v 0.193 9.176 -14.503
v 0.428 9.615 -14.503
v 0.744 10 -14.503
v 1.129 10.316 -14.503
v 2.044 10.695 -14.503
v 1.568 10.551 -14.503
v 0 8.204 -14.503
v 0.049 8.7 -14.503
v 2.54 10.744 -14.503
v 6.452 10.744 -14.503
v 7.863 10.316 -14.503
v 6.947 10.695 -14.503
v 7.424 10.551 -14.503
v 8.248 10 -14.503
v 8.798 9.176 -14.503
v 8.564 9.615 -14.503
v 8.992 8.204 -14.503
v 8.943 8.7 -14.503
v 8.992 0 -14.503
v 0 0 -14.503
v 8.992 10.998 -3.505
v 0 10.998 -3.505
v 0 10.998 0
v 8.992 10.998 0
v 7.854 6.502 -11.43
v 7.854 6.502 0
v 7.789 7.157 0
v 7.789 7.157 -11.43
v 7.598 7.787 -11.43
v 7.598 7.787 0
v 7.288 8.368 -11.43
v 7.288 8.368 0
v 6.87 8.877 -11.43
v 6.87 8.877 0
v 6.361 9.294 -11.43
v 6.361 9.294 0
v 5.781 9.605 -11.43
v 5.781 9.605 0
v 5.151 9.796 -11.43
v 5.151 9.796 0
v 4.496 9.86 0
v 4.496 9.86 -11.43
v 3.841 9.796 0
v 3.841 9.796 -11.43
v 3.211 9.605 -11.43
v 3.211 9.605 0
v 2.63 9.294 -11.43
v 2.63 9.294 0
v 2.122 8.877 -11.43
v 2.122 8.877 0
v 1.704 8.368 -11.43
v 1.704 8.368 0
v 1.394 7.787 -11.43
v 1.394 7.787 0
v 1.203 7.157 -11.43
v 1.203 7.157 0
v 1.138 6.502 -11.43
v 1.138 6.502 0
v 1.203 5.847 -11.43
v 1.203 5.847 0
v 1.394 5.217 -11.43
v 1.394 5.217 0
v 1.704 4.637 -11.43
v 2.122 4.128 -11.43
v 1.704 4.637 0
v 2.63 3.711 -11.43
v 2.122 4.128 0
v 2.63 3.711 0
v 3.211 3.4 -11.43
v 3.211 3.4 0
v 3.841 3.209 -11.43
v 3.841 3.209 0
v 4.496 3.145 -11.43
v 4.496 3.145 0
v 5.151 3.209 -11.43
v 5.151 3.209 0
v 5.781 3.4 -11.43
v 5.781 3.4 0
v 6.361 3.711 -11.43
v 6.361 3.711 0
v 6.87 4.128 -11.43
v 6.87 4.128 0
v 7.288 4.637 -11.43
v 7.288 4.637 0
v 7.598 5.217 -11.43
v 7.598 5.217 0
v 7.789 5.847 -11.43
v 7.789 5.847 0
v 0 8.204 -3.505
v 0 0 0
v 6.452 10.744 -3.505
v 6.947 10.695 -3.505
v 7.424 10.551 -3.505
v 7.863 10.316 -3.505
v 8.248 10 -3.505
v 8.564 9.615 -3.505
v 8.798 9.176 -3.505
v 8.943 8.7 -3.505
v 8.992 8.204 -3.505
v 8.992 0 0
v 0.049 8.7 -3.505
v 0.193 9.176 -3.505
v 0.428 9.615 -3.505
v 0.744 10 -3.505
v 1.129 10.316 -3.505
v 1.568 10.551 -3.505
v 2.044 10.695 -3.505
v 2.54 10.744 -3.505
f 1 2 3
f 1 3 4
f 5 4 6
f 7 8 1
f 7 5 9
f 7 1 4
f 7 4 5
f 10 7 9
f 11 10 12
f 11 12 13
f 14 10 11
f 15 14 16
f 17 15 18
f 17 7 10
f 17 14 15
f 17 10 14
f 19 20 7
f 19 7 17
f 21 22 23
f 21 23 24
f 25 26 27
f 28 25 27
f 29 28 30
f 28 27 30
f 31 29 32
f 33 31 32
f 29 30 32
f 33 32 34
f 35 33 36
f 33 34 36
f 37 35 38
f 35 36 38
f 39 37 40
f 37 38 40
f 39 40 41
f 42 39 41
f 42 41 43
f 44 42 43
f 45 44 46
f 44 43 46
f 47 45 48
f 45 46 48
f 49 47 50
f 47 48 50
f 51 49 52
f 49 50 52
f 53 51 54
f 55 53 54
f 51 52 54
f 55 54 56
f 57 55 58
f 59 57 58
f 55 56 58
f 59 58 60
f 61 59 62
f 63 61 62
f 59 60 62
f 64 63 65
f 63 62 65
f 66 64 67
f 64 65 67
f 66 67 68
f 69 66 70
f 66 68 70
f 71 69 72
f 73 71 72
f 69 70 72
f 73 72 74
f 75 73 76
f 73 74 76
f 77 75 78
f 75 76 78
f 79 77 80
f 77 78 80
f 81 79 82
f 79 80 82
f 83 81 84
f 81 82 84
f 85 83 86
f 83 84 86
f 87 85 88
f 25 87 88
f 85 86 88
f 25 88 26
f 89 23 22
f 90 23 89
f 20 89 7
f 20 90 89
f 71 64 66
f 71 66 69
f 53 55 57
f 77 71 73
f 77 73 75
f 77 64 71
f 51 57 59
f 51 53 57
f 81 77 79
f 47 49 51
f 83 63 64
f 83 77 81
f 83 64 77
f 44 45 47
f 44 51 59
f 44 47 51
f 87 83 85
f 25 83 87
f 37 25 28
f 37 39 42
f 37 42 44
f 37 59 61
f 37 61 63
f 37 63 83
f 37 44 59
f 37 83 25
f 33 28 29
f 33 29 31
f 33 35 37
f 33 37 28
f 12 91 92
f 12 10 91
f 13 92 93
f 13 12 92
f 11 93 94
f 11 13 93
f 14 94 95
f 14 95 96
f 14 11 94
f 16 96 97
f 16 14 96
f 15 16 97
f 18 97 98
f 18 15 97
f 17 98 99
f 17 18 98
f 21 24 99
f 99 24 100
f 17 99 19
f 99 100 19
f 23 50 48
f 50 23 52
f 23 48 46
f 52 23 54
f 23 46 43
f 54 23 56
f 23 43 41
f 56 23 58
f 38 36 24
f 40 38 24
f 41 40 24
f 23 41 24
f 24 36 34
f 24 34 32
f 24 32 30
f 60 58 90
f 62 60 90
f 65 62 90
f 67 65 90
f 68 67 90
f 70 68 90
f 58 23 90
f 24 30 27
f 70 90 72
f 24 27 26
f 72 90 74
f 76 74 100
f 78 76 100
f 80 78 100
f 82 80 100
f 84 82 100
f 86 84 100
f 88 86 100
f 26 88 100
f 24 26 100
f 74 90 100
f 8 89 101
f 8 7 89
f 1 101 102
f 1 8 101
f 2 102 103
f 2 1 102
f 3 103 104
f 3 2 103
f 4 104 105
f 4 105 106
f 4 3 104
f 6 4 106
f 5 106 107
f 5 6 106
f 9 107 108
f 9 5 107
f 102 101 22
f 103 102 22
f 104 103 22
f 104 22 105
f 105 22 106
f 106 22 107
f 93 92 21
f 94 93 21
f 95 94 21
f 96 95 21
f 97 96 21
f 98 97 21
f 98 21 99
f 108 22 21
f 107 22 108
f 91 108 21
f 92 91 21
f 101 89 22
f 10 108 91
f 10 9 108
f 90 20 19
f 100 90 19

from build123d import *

# Parameters (mm, degrees)
SKETCH1_W           = 8.9916
SKETCH1_H           = 14.5034
BOSS_EXTRUDE1_DEPTH = 10.9982
SKETCH2_R           = 3.357740144
CUT_EXTRUDE1_DEPTH  = 11.43
SKETCH3_W           = 8.9916
SKETCH3_H           = 10.9982
CUT_EXTRUDE2_DEPTH  = 0.254
FILLET1_R           = 2.54
FILLET2_R           = 2.54


with BuildPart() as part:
    # Sketch1 → Boss-Extrude1 (new body)
    with BuildSketch(Plane(origin=(0, 0, 0), x_dir=(1, 0, 0), z_dir=(0, 1, 0))):
        with Locations((4.4958, 7.2517)):
            Rectangle(SKETCH1_W, SKETCH1_H)
    extrude(amount=BOSS_EXTRUDE1_DEPTH)

    # Sketch2 → Cut-Extrude1 (cut)
    with BuildSketch(Plane.XY):
        with Locations((4.4958, 6.5024)):
            Circle(SKETCH2_R)
    extrude(amount=-CUT_EXTRUDE1_DEPTH, mode=Mode.SUBTRACT)

    # Sketch3 → Cut-Extrude2 (cut)
    with BuildSketch(Plane(origin=(0, 10.9982, 0), x_dir=(1, 0, 0), z_dir=(0, 1, 0))):
        with Locations((4.4958, 9.0043)):
            Rectangle(SKETCH3_W, SKETCH3_H)
    extrude(amount=-CUT_EXTRUDE2_DEPTH, mode=Mode.SUBTRACT)

    # Fillet1
    fillet1_edges = [part.edges().sort_by_distance(p)[0] for p in [
        (8.9916, 10.7442, -9.0043),
    ]]
    fillet(fillet1_edges, radius=FILLET1_R)

    # Fillet2
    fillet2_edges = [part.edges().sort_by_distance(p)[0] for p in [
        (0, 10.7442, -9.0043),
    ]]
    fillet(fillet2_edges, radius=FILLET2_R)


solid = part.part
